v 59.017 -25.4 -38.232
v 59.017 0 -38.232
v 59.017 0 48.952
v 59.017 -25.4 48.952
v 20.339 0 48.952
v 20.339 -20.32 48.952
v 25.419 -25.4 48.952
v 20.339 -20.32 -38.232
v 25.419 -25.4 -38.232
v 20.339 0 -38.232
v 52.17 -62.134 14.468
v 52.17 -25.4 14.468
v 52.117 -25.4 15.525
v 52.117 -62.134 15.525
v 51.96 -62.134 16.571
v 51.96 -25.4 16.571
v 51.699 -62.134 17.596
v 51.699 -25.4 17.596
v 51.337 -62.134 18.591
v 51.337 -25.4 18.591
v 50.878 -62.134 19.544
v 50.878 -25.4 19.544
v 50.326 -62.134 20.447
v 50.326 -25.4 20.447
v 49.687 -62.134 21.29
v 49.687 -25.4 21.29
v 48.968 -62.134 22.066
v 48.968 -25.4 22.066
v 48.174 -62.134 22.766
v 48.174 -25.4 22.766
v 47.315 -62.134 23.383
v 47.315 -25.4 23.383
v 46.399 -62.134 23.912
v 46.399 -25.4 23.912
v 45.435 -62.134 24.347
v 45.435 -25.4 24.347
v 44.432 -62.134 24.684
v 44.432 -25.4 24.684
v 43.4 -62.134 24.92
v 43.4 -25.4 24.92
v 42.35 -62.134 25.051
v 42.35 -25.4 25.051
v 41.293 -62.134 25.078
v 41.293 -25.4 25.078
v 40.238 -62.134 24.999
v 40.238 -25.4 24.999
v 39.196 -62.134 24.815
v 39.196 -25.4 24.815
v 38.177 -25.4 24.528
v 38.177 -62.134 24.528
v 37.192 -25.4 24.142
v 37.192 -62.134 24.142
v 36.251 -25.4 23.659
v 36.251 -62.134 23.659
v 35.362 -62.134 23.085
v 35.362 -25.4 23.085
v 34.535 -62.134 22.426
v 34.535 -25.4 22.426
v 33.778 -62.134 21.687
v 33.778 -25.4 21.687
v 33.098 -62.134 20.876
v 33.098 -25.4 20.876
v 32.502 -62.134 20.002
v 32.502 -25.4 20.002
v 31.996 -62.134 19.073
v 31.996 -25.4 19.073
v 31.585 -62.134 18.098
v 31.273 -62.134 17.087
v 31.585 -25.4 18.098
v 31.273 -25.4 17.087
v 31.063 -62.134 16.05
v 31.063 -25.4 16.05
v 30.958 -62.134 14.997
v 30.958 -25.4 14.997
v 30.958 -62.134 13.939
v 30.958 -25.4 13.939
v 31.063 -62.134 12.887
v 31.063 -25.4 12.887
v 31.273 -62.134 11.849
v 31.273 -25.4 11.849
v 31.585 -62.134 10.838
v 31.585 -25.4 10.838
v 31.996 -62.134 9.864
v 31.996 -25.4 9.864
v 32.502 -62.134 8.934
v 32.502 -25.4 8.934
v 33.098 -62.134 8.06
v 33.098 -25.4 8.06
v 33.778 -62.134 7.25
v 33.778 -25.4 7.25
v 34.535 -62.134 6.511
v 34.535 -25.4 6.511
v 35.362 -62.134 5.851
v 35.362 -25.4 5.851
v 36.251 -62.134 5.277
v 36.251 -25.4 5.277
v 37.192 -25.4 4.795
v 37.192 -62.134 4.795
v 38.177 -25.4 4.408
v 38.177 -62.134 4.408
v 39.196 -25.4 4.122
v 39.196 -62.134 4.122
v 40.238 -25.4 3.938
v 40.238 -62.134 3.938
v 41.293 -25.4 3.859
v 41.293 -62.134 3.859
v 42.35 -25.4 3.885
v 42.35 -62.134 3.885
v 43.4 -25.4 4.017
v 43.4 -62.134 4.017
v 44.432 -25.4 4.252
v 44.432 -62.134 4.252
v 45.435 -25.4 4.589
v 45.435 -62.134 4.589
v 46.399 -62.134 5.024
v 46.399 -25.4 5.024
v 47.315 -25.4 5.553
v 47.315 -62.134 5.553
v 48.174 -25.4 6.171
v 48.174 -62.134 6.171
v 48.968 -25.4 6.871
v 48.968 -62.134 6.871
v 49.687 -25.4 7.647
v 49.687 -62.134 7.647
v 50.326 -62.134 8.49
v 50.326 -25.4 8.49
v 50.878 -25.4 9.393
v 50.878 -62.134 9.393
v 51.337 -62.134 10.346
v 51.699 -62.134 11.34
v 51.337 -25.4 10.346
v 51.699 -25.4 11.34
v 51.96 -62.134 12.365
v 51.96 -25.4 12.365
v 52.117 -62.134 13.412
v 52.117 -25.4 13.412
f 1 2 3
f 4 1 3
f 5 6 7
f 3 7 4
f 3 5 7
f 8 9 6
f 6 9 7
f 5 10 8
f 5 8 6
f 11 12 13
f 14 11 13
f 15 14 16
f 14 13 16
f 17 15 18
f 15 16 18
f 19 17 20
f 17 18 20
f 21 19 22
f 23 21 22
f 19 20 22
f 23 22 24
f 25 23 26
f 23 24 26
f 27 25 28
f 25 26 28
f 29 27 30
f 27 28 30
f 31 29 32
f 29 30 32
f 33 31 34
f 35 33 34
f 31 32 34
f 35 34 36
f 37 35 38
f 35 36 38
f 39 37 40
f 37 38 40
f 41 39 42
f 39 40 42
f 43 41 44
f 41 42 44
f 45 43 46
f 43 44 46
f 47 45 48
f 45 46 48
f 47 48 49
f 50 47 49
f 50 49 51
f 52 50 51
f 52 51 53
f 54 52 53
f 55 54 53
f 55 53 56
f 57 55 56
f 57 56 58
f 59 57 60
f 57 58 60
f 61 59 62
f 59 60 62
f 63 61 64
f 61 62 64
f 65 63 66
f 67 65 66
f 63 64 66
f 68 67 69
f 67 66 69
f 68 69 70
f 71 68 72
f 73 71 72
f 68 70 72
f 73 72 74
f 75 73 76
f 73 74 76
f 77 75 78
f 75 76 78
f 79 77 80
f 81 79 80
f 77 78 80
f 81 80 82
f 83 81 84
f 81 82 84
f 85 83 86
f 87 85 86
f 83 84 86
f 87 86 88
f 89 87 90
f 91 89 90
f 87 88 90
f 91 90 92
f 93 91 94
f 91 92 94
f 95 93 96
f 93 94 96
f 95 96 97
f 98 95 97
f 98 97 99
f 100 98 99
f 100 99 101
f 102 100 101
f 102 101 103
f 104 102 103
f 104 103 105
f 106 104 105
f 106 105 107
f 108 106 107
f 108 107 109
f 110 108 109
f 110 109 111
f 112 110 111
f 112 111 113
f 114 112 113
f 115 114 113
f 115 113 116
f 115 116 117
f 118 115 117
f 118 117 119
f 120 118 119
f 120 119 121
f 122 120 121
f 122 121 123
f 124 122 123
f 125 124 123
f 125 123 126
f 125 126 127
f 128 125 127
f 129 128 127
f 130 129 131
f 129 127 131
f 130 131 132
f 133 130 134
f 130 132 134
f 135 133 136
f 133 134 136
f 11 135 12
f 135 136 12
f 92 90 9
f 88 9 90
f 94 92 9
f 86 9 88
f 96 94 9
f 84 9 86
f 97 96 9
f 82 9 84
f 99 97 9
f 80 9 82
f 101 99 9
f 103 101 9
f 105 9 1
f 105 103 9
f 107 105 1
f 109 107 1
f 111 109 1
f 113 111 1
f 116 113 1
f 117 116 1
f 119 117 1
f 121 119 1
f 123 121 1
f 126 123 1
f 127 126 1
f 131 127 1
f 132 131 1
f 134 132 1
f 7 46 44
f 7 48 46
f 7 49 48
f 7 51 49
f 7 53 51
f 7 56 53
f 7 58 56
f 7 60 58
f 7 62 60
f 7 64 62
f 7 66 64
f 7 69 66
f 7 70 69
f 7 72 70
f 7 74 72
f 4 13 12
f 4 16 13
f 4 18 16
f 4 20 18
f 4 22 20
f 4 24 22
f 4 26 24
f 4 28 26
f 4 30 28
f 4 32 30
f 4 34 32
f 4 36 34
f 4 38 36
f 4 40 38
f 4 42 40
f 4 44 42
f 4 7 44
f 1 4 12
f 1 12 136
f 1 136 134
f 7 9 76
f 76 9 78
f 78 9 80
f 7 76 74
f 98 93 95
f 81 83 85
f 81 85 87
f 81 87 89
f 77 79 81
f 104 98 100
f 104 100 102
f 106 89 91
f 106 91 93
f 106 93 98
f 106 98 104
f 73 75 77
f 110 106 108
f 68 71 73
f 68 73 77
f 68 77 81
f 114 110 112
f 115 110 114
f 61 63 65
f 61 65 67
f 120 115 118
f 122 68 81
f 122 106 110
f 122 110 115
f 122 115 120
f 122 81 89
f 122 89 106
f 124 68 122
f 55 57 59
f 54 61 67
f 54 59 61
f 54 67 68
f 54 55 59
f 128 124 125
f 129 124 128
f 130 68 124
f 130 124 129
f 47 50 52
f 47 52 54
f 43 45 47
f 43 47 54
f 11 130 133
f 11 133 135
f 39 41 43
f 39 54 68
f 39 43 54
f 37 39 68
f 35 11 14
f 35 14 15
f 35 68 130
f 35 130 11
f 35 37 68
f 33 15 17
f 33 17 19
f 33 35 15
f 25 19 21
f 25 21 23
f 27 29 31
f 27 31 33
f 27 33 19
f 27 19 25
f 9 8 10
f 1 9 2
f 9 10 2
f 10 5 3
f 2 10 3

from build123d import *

# Parameters (mm, degrees)
F0_W     = 38.677551
F0_H     = 87.183475
F1_DEPTH = 25.4
F2_R     = 10.61277
F3_DEPTH = 36.733858
F4_SIZE  = 5.08


with BuildPart() as f1:
    # F0 (on Front) → F1 (new body)
    with BuildSketch(Plane.XZ):
        with Locations((39.677791, 5.360209)):
            Rectangle(F0_W, F0_H)
    extrude(amount=F1_DEPTH)

    # F2 (on face) → F3 (join)
    with BuildSketch(Plane.XZ.offset(25.4)):
        with Locations((41.557305, 14.468271)):
            Circle(F2_R)
    extrude(amount=F3_DEPTH)

    # F4
    f4_edges = [f1.edges().sort_by_distance(p)[0] for p in [
        (20.339016, -25.4, 5.360208),
    ]]
    chamfer(f4_edges, length=F4_SIZE)


solid = f1.part
